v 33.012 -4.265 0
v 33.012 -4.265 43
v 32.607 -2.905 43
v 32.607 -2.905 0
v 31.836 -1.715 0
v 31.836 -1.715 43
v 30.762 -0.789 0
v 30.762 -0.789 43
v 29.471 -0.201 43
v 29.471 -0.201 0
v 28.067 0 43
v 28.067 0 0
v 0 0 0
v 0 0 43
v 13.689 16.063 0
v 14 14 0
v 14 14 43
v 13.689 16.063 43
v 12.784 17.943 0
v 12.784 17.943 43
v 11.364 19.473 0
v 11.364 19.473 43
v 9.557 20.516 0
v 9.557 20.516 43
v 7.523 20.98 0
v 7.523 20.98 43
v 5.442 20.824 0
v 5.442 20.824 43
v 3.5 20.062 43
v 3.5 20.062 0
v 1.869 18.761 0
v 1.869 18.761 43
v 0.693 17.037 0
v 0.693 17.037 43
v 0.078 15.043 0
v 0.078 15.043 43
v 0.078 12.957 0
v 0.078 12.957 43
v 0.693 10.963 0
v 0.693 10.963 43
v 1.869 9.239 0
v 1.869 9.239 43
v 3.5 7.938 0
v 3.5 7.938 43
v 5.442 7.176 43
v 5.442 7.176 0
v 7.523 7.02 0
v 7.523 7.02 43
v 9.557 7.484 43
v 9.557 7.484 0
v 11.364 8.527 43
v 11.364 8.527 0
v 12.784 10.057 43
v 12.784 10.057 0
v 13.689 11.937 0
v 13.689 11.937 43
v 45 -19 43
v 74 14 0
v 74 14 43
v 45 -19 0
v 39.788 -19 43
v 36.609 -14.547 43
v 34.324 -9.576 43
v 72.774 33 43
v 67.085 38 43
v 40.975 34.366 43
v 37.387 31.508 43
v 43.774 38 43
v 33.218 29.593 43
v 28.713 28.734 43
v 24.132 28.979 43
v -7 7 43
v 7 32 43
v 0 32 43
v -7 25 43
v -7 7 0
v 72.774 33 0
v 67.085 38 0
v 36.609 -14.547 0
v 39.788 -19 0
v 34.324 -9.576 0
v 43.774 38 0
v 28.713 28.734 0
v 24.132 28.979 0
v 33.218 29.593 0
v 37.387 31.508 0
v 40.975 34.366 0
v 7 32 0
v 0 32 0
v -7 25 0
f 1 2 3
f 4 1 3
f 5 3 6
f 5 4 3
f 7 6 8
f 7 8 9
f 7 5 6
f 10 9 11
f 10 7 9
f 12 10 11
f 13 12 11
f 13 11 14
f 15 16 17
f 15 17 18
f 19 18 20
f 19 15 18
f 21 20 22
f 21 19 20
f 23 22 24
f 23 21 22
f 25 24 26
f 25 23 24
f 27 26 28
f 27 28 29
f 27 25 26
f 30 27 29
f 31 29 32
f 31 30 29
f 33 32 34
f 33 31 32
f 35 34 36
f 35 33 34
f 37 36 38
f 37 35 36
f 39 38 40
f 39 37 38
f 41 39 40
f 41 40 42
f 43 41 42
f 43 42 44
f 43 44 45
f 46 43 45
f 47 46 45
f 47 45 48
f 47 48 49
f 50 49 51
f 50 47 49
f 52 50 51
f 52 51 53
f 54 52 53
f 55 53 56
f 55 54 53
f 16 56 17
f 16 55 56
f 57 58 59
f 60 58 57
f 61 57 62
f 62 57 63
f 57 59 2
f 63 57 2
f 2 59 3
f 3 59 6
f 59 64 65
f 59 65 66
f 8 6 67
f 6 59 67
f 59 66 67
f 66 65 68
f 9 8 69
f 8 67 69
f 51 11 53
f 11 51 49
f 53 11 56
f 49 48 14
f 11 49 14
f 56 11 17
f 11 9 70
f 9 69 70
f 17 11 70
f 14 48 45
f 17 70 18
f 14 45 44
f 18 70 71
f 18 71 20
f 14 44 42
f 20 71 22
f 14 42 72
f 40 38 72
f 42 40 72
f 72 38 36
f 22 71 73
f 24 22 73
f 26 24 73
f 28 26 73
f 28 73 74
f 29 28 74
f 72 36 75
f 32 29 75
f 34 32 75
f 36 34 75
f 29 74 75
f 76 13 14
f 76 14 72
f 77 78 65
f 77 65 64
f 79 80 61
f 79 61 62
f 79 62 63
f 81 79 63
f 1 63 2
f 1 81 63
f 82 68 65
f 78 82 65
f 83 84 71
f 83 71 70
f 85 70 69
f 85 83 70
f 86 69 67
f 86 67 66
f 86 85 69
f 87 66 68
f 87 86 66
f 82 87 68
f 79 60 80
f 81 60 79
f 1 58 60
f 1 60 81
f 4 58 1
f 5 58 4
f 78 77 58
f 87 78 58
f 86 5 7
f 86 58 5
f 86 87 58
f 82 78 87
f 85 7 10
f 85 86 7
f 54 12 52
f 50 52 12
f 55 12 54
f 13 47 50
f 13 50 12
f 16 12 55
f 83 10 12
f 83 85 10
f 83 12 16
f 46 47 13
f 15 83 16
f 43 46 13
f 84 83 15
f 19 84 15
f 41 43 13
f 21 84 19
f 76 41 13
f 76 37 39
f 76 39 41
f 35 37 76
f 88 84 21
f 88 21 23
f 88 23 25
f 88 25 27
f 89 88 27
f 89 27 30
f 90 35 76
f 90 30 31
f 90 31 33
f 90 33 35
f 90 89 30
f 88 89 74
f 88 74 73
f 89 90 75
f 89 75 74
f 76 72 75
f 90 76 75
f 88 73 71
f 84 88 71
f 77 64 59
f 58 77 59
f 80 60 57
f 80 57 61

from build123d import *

# Parameters (mm, degrees)
SKETCH1_R           = 7
BOSS_EXTRUDE1_DEPTH = 43


with BuildPart() as part:
    # Sketch1 → Boss-Extrude1 (new body)
    with BuildSketch(Plane.XY):
        with BuildLine():
            Line((0, 0), (-7, 7))
            Line((-7, 7), (-7, 25))
            Line((-7, 25), (0, 32))
            Line((0, 32), (7, 32))
            Line((7, 32), (24.131881406, 28.979187078))
            ThreePointArc((24.131881406, 28.979187078), (35.36077259, 30.424329605), (43.774193548, 38))
            Line((43.774193548, 38), (67.084538376, 38))
            Line((67.084538376, 38), (72.774193548, 33))
            Line((72.774193548, 33), (74, 14))
            Line((74, 14), (45, -19))
            Line((45, -19), (39.788067397, -19))
            ThreePointArc((39.788067397, -19), (35.3490952, -12.115672061), (33.012264997, -4.264705882))
            ThreePointArc((33.012264997, -4.264705882), (31.331862036, -1.213413768), (28.066626255, 0))
            Line((28.066626255, 0), (0, 0))
        make_face()
        with Locations((7, 14)):
            Circle(SKETCH1_R, mode=Mode.SUBTRACT)
    extrude(amount=BOSS_EXTRUDE1_DEPTH)


solid = part.part
